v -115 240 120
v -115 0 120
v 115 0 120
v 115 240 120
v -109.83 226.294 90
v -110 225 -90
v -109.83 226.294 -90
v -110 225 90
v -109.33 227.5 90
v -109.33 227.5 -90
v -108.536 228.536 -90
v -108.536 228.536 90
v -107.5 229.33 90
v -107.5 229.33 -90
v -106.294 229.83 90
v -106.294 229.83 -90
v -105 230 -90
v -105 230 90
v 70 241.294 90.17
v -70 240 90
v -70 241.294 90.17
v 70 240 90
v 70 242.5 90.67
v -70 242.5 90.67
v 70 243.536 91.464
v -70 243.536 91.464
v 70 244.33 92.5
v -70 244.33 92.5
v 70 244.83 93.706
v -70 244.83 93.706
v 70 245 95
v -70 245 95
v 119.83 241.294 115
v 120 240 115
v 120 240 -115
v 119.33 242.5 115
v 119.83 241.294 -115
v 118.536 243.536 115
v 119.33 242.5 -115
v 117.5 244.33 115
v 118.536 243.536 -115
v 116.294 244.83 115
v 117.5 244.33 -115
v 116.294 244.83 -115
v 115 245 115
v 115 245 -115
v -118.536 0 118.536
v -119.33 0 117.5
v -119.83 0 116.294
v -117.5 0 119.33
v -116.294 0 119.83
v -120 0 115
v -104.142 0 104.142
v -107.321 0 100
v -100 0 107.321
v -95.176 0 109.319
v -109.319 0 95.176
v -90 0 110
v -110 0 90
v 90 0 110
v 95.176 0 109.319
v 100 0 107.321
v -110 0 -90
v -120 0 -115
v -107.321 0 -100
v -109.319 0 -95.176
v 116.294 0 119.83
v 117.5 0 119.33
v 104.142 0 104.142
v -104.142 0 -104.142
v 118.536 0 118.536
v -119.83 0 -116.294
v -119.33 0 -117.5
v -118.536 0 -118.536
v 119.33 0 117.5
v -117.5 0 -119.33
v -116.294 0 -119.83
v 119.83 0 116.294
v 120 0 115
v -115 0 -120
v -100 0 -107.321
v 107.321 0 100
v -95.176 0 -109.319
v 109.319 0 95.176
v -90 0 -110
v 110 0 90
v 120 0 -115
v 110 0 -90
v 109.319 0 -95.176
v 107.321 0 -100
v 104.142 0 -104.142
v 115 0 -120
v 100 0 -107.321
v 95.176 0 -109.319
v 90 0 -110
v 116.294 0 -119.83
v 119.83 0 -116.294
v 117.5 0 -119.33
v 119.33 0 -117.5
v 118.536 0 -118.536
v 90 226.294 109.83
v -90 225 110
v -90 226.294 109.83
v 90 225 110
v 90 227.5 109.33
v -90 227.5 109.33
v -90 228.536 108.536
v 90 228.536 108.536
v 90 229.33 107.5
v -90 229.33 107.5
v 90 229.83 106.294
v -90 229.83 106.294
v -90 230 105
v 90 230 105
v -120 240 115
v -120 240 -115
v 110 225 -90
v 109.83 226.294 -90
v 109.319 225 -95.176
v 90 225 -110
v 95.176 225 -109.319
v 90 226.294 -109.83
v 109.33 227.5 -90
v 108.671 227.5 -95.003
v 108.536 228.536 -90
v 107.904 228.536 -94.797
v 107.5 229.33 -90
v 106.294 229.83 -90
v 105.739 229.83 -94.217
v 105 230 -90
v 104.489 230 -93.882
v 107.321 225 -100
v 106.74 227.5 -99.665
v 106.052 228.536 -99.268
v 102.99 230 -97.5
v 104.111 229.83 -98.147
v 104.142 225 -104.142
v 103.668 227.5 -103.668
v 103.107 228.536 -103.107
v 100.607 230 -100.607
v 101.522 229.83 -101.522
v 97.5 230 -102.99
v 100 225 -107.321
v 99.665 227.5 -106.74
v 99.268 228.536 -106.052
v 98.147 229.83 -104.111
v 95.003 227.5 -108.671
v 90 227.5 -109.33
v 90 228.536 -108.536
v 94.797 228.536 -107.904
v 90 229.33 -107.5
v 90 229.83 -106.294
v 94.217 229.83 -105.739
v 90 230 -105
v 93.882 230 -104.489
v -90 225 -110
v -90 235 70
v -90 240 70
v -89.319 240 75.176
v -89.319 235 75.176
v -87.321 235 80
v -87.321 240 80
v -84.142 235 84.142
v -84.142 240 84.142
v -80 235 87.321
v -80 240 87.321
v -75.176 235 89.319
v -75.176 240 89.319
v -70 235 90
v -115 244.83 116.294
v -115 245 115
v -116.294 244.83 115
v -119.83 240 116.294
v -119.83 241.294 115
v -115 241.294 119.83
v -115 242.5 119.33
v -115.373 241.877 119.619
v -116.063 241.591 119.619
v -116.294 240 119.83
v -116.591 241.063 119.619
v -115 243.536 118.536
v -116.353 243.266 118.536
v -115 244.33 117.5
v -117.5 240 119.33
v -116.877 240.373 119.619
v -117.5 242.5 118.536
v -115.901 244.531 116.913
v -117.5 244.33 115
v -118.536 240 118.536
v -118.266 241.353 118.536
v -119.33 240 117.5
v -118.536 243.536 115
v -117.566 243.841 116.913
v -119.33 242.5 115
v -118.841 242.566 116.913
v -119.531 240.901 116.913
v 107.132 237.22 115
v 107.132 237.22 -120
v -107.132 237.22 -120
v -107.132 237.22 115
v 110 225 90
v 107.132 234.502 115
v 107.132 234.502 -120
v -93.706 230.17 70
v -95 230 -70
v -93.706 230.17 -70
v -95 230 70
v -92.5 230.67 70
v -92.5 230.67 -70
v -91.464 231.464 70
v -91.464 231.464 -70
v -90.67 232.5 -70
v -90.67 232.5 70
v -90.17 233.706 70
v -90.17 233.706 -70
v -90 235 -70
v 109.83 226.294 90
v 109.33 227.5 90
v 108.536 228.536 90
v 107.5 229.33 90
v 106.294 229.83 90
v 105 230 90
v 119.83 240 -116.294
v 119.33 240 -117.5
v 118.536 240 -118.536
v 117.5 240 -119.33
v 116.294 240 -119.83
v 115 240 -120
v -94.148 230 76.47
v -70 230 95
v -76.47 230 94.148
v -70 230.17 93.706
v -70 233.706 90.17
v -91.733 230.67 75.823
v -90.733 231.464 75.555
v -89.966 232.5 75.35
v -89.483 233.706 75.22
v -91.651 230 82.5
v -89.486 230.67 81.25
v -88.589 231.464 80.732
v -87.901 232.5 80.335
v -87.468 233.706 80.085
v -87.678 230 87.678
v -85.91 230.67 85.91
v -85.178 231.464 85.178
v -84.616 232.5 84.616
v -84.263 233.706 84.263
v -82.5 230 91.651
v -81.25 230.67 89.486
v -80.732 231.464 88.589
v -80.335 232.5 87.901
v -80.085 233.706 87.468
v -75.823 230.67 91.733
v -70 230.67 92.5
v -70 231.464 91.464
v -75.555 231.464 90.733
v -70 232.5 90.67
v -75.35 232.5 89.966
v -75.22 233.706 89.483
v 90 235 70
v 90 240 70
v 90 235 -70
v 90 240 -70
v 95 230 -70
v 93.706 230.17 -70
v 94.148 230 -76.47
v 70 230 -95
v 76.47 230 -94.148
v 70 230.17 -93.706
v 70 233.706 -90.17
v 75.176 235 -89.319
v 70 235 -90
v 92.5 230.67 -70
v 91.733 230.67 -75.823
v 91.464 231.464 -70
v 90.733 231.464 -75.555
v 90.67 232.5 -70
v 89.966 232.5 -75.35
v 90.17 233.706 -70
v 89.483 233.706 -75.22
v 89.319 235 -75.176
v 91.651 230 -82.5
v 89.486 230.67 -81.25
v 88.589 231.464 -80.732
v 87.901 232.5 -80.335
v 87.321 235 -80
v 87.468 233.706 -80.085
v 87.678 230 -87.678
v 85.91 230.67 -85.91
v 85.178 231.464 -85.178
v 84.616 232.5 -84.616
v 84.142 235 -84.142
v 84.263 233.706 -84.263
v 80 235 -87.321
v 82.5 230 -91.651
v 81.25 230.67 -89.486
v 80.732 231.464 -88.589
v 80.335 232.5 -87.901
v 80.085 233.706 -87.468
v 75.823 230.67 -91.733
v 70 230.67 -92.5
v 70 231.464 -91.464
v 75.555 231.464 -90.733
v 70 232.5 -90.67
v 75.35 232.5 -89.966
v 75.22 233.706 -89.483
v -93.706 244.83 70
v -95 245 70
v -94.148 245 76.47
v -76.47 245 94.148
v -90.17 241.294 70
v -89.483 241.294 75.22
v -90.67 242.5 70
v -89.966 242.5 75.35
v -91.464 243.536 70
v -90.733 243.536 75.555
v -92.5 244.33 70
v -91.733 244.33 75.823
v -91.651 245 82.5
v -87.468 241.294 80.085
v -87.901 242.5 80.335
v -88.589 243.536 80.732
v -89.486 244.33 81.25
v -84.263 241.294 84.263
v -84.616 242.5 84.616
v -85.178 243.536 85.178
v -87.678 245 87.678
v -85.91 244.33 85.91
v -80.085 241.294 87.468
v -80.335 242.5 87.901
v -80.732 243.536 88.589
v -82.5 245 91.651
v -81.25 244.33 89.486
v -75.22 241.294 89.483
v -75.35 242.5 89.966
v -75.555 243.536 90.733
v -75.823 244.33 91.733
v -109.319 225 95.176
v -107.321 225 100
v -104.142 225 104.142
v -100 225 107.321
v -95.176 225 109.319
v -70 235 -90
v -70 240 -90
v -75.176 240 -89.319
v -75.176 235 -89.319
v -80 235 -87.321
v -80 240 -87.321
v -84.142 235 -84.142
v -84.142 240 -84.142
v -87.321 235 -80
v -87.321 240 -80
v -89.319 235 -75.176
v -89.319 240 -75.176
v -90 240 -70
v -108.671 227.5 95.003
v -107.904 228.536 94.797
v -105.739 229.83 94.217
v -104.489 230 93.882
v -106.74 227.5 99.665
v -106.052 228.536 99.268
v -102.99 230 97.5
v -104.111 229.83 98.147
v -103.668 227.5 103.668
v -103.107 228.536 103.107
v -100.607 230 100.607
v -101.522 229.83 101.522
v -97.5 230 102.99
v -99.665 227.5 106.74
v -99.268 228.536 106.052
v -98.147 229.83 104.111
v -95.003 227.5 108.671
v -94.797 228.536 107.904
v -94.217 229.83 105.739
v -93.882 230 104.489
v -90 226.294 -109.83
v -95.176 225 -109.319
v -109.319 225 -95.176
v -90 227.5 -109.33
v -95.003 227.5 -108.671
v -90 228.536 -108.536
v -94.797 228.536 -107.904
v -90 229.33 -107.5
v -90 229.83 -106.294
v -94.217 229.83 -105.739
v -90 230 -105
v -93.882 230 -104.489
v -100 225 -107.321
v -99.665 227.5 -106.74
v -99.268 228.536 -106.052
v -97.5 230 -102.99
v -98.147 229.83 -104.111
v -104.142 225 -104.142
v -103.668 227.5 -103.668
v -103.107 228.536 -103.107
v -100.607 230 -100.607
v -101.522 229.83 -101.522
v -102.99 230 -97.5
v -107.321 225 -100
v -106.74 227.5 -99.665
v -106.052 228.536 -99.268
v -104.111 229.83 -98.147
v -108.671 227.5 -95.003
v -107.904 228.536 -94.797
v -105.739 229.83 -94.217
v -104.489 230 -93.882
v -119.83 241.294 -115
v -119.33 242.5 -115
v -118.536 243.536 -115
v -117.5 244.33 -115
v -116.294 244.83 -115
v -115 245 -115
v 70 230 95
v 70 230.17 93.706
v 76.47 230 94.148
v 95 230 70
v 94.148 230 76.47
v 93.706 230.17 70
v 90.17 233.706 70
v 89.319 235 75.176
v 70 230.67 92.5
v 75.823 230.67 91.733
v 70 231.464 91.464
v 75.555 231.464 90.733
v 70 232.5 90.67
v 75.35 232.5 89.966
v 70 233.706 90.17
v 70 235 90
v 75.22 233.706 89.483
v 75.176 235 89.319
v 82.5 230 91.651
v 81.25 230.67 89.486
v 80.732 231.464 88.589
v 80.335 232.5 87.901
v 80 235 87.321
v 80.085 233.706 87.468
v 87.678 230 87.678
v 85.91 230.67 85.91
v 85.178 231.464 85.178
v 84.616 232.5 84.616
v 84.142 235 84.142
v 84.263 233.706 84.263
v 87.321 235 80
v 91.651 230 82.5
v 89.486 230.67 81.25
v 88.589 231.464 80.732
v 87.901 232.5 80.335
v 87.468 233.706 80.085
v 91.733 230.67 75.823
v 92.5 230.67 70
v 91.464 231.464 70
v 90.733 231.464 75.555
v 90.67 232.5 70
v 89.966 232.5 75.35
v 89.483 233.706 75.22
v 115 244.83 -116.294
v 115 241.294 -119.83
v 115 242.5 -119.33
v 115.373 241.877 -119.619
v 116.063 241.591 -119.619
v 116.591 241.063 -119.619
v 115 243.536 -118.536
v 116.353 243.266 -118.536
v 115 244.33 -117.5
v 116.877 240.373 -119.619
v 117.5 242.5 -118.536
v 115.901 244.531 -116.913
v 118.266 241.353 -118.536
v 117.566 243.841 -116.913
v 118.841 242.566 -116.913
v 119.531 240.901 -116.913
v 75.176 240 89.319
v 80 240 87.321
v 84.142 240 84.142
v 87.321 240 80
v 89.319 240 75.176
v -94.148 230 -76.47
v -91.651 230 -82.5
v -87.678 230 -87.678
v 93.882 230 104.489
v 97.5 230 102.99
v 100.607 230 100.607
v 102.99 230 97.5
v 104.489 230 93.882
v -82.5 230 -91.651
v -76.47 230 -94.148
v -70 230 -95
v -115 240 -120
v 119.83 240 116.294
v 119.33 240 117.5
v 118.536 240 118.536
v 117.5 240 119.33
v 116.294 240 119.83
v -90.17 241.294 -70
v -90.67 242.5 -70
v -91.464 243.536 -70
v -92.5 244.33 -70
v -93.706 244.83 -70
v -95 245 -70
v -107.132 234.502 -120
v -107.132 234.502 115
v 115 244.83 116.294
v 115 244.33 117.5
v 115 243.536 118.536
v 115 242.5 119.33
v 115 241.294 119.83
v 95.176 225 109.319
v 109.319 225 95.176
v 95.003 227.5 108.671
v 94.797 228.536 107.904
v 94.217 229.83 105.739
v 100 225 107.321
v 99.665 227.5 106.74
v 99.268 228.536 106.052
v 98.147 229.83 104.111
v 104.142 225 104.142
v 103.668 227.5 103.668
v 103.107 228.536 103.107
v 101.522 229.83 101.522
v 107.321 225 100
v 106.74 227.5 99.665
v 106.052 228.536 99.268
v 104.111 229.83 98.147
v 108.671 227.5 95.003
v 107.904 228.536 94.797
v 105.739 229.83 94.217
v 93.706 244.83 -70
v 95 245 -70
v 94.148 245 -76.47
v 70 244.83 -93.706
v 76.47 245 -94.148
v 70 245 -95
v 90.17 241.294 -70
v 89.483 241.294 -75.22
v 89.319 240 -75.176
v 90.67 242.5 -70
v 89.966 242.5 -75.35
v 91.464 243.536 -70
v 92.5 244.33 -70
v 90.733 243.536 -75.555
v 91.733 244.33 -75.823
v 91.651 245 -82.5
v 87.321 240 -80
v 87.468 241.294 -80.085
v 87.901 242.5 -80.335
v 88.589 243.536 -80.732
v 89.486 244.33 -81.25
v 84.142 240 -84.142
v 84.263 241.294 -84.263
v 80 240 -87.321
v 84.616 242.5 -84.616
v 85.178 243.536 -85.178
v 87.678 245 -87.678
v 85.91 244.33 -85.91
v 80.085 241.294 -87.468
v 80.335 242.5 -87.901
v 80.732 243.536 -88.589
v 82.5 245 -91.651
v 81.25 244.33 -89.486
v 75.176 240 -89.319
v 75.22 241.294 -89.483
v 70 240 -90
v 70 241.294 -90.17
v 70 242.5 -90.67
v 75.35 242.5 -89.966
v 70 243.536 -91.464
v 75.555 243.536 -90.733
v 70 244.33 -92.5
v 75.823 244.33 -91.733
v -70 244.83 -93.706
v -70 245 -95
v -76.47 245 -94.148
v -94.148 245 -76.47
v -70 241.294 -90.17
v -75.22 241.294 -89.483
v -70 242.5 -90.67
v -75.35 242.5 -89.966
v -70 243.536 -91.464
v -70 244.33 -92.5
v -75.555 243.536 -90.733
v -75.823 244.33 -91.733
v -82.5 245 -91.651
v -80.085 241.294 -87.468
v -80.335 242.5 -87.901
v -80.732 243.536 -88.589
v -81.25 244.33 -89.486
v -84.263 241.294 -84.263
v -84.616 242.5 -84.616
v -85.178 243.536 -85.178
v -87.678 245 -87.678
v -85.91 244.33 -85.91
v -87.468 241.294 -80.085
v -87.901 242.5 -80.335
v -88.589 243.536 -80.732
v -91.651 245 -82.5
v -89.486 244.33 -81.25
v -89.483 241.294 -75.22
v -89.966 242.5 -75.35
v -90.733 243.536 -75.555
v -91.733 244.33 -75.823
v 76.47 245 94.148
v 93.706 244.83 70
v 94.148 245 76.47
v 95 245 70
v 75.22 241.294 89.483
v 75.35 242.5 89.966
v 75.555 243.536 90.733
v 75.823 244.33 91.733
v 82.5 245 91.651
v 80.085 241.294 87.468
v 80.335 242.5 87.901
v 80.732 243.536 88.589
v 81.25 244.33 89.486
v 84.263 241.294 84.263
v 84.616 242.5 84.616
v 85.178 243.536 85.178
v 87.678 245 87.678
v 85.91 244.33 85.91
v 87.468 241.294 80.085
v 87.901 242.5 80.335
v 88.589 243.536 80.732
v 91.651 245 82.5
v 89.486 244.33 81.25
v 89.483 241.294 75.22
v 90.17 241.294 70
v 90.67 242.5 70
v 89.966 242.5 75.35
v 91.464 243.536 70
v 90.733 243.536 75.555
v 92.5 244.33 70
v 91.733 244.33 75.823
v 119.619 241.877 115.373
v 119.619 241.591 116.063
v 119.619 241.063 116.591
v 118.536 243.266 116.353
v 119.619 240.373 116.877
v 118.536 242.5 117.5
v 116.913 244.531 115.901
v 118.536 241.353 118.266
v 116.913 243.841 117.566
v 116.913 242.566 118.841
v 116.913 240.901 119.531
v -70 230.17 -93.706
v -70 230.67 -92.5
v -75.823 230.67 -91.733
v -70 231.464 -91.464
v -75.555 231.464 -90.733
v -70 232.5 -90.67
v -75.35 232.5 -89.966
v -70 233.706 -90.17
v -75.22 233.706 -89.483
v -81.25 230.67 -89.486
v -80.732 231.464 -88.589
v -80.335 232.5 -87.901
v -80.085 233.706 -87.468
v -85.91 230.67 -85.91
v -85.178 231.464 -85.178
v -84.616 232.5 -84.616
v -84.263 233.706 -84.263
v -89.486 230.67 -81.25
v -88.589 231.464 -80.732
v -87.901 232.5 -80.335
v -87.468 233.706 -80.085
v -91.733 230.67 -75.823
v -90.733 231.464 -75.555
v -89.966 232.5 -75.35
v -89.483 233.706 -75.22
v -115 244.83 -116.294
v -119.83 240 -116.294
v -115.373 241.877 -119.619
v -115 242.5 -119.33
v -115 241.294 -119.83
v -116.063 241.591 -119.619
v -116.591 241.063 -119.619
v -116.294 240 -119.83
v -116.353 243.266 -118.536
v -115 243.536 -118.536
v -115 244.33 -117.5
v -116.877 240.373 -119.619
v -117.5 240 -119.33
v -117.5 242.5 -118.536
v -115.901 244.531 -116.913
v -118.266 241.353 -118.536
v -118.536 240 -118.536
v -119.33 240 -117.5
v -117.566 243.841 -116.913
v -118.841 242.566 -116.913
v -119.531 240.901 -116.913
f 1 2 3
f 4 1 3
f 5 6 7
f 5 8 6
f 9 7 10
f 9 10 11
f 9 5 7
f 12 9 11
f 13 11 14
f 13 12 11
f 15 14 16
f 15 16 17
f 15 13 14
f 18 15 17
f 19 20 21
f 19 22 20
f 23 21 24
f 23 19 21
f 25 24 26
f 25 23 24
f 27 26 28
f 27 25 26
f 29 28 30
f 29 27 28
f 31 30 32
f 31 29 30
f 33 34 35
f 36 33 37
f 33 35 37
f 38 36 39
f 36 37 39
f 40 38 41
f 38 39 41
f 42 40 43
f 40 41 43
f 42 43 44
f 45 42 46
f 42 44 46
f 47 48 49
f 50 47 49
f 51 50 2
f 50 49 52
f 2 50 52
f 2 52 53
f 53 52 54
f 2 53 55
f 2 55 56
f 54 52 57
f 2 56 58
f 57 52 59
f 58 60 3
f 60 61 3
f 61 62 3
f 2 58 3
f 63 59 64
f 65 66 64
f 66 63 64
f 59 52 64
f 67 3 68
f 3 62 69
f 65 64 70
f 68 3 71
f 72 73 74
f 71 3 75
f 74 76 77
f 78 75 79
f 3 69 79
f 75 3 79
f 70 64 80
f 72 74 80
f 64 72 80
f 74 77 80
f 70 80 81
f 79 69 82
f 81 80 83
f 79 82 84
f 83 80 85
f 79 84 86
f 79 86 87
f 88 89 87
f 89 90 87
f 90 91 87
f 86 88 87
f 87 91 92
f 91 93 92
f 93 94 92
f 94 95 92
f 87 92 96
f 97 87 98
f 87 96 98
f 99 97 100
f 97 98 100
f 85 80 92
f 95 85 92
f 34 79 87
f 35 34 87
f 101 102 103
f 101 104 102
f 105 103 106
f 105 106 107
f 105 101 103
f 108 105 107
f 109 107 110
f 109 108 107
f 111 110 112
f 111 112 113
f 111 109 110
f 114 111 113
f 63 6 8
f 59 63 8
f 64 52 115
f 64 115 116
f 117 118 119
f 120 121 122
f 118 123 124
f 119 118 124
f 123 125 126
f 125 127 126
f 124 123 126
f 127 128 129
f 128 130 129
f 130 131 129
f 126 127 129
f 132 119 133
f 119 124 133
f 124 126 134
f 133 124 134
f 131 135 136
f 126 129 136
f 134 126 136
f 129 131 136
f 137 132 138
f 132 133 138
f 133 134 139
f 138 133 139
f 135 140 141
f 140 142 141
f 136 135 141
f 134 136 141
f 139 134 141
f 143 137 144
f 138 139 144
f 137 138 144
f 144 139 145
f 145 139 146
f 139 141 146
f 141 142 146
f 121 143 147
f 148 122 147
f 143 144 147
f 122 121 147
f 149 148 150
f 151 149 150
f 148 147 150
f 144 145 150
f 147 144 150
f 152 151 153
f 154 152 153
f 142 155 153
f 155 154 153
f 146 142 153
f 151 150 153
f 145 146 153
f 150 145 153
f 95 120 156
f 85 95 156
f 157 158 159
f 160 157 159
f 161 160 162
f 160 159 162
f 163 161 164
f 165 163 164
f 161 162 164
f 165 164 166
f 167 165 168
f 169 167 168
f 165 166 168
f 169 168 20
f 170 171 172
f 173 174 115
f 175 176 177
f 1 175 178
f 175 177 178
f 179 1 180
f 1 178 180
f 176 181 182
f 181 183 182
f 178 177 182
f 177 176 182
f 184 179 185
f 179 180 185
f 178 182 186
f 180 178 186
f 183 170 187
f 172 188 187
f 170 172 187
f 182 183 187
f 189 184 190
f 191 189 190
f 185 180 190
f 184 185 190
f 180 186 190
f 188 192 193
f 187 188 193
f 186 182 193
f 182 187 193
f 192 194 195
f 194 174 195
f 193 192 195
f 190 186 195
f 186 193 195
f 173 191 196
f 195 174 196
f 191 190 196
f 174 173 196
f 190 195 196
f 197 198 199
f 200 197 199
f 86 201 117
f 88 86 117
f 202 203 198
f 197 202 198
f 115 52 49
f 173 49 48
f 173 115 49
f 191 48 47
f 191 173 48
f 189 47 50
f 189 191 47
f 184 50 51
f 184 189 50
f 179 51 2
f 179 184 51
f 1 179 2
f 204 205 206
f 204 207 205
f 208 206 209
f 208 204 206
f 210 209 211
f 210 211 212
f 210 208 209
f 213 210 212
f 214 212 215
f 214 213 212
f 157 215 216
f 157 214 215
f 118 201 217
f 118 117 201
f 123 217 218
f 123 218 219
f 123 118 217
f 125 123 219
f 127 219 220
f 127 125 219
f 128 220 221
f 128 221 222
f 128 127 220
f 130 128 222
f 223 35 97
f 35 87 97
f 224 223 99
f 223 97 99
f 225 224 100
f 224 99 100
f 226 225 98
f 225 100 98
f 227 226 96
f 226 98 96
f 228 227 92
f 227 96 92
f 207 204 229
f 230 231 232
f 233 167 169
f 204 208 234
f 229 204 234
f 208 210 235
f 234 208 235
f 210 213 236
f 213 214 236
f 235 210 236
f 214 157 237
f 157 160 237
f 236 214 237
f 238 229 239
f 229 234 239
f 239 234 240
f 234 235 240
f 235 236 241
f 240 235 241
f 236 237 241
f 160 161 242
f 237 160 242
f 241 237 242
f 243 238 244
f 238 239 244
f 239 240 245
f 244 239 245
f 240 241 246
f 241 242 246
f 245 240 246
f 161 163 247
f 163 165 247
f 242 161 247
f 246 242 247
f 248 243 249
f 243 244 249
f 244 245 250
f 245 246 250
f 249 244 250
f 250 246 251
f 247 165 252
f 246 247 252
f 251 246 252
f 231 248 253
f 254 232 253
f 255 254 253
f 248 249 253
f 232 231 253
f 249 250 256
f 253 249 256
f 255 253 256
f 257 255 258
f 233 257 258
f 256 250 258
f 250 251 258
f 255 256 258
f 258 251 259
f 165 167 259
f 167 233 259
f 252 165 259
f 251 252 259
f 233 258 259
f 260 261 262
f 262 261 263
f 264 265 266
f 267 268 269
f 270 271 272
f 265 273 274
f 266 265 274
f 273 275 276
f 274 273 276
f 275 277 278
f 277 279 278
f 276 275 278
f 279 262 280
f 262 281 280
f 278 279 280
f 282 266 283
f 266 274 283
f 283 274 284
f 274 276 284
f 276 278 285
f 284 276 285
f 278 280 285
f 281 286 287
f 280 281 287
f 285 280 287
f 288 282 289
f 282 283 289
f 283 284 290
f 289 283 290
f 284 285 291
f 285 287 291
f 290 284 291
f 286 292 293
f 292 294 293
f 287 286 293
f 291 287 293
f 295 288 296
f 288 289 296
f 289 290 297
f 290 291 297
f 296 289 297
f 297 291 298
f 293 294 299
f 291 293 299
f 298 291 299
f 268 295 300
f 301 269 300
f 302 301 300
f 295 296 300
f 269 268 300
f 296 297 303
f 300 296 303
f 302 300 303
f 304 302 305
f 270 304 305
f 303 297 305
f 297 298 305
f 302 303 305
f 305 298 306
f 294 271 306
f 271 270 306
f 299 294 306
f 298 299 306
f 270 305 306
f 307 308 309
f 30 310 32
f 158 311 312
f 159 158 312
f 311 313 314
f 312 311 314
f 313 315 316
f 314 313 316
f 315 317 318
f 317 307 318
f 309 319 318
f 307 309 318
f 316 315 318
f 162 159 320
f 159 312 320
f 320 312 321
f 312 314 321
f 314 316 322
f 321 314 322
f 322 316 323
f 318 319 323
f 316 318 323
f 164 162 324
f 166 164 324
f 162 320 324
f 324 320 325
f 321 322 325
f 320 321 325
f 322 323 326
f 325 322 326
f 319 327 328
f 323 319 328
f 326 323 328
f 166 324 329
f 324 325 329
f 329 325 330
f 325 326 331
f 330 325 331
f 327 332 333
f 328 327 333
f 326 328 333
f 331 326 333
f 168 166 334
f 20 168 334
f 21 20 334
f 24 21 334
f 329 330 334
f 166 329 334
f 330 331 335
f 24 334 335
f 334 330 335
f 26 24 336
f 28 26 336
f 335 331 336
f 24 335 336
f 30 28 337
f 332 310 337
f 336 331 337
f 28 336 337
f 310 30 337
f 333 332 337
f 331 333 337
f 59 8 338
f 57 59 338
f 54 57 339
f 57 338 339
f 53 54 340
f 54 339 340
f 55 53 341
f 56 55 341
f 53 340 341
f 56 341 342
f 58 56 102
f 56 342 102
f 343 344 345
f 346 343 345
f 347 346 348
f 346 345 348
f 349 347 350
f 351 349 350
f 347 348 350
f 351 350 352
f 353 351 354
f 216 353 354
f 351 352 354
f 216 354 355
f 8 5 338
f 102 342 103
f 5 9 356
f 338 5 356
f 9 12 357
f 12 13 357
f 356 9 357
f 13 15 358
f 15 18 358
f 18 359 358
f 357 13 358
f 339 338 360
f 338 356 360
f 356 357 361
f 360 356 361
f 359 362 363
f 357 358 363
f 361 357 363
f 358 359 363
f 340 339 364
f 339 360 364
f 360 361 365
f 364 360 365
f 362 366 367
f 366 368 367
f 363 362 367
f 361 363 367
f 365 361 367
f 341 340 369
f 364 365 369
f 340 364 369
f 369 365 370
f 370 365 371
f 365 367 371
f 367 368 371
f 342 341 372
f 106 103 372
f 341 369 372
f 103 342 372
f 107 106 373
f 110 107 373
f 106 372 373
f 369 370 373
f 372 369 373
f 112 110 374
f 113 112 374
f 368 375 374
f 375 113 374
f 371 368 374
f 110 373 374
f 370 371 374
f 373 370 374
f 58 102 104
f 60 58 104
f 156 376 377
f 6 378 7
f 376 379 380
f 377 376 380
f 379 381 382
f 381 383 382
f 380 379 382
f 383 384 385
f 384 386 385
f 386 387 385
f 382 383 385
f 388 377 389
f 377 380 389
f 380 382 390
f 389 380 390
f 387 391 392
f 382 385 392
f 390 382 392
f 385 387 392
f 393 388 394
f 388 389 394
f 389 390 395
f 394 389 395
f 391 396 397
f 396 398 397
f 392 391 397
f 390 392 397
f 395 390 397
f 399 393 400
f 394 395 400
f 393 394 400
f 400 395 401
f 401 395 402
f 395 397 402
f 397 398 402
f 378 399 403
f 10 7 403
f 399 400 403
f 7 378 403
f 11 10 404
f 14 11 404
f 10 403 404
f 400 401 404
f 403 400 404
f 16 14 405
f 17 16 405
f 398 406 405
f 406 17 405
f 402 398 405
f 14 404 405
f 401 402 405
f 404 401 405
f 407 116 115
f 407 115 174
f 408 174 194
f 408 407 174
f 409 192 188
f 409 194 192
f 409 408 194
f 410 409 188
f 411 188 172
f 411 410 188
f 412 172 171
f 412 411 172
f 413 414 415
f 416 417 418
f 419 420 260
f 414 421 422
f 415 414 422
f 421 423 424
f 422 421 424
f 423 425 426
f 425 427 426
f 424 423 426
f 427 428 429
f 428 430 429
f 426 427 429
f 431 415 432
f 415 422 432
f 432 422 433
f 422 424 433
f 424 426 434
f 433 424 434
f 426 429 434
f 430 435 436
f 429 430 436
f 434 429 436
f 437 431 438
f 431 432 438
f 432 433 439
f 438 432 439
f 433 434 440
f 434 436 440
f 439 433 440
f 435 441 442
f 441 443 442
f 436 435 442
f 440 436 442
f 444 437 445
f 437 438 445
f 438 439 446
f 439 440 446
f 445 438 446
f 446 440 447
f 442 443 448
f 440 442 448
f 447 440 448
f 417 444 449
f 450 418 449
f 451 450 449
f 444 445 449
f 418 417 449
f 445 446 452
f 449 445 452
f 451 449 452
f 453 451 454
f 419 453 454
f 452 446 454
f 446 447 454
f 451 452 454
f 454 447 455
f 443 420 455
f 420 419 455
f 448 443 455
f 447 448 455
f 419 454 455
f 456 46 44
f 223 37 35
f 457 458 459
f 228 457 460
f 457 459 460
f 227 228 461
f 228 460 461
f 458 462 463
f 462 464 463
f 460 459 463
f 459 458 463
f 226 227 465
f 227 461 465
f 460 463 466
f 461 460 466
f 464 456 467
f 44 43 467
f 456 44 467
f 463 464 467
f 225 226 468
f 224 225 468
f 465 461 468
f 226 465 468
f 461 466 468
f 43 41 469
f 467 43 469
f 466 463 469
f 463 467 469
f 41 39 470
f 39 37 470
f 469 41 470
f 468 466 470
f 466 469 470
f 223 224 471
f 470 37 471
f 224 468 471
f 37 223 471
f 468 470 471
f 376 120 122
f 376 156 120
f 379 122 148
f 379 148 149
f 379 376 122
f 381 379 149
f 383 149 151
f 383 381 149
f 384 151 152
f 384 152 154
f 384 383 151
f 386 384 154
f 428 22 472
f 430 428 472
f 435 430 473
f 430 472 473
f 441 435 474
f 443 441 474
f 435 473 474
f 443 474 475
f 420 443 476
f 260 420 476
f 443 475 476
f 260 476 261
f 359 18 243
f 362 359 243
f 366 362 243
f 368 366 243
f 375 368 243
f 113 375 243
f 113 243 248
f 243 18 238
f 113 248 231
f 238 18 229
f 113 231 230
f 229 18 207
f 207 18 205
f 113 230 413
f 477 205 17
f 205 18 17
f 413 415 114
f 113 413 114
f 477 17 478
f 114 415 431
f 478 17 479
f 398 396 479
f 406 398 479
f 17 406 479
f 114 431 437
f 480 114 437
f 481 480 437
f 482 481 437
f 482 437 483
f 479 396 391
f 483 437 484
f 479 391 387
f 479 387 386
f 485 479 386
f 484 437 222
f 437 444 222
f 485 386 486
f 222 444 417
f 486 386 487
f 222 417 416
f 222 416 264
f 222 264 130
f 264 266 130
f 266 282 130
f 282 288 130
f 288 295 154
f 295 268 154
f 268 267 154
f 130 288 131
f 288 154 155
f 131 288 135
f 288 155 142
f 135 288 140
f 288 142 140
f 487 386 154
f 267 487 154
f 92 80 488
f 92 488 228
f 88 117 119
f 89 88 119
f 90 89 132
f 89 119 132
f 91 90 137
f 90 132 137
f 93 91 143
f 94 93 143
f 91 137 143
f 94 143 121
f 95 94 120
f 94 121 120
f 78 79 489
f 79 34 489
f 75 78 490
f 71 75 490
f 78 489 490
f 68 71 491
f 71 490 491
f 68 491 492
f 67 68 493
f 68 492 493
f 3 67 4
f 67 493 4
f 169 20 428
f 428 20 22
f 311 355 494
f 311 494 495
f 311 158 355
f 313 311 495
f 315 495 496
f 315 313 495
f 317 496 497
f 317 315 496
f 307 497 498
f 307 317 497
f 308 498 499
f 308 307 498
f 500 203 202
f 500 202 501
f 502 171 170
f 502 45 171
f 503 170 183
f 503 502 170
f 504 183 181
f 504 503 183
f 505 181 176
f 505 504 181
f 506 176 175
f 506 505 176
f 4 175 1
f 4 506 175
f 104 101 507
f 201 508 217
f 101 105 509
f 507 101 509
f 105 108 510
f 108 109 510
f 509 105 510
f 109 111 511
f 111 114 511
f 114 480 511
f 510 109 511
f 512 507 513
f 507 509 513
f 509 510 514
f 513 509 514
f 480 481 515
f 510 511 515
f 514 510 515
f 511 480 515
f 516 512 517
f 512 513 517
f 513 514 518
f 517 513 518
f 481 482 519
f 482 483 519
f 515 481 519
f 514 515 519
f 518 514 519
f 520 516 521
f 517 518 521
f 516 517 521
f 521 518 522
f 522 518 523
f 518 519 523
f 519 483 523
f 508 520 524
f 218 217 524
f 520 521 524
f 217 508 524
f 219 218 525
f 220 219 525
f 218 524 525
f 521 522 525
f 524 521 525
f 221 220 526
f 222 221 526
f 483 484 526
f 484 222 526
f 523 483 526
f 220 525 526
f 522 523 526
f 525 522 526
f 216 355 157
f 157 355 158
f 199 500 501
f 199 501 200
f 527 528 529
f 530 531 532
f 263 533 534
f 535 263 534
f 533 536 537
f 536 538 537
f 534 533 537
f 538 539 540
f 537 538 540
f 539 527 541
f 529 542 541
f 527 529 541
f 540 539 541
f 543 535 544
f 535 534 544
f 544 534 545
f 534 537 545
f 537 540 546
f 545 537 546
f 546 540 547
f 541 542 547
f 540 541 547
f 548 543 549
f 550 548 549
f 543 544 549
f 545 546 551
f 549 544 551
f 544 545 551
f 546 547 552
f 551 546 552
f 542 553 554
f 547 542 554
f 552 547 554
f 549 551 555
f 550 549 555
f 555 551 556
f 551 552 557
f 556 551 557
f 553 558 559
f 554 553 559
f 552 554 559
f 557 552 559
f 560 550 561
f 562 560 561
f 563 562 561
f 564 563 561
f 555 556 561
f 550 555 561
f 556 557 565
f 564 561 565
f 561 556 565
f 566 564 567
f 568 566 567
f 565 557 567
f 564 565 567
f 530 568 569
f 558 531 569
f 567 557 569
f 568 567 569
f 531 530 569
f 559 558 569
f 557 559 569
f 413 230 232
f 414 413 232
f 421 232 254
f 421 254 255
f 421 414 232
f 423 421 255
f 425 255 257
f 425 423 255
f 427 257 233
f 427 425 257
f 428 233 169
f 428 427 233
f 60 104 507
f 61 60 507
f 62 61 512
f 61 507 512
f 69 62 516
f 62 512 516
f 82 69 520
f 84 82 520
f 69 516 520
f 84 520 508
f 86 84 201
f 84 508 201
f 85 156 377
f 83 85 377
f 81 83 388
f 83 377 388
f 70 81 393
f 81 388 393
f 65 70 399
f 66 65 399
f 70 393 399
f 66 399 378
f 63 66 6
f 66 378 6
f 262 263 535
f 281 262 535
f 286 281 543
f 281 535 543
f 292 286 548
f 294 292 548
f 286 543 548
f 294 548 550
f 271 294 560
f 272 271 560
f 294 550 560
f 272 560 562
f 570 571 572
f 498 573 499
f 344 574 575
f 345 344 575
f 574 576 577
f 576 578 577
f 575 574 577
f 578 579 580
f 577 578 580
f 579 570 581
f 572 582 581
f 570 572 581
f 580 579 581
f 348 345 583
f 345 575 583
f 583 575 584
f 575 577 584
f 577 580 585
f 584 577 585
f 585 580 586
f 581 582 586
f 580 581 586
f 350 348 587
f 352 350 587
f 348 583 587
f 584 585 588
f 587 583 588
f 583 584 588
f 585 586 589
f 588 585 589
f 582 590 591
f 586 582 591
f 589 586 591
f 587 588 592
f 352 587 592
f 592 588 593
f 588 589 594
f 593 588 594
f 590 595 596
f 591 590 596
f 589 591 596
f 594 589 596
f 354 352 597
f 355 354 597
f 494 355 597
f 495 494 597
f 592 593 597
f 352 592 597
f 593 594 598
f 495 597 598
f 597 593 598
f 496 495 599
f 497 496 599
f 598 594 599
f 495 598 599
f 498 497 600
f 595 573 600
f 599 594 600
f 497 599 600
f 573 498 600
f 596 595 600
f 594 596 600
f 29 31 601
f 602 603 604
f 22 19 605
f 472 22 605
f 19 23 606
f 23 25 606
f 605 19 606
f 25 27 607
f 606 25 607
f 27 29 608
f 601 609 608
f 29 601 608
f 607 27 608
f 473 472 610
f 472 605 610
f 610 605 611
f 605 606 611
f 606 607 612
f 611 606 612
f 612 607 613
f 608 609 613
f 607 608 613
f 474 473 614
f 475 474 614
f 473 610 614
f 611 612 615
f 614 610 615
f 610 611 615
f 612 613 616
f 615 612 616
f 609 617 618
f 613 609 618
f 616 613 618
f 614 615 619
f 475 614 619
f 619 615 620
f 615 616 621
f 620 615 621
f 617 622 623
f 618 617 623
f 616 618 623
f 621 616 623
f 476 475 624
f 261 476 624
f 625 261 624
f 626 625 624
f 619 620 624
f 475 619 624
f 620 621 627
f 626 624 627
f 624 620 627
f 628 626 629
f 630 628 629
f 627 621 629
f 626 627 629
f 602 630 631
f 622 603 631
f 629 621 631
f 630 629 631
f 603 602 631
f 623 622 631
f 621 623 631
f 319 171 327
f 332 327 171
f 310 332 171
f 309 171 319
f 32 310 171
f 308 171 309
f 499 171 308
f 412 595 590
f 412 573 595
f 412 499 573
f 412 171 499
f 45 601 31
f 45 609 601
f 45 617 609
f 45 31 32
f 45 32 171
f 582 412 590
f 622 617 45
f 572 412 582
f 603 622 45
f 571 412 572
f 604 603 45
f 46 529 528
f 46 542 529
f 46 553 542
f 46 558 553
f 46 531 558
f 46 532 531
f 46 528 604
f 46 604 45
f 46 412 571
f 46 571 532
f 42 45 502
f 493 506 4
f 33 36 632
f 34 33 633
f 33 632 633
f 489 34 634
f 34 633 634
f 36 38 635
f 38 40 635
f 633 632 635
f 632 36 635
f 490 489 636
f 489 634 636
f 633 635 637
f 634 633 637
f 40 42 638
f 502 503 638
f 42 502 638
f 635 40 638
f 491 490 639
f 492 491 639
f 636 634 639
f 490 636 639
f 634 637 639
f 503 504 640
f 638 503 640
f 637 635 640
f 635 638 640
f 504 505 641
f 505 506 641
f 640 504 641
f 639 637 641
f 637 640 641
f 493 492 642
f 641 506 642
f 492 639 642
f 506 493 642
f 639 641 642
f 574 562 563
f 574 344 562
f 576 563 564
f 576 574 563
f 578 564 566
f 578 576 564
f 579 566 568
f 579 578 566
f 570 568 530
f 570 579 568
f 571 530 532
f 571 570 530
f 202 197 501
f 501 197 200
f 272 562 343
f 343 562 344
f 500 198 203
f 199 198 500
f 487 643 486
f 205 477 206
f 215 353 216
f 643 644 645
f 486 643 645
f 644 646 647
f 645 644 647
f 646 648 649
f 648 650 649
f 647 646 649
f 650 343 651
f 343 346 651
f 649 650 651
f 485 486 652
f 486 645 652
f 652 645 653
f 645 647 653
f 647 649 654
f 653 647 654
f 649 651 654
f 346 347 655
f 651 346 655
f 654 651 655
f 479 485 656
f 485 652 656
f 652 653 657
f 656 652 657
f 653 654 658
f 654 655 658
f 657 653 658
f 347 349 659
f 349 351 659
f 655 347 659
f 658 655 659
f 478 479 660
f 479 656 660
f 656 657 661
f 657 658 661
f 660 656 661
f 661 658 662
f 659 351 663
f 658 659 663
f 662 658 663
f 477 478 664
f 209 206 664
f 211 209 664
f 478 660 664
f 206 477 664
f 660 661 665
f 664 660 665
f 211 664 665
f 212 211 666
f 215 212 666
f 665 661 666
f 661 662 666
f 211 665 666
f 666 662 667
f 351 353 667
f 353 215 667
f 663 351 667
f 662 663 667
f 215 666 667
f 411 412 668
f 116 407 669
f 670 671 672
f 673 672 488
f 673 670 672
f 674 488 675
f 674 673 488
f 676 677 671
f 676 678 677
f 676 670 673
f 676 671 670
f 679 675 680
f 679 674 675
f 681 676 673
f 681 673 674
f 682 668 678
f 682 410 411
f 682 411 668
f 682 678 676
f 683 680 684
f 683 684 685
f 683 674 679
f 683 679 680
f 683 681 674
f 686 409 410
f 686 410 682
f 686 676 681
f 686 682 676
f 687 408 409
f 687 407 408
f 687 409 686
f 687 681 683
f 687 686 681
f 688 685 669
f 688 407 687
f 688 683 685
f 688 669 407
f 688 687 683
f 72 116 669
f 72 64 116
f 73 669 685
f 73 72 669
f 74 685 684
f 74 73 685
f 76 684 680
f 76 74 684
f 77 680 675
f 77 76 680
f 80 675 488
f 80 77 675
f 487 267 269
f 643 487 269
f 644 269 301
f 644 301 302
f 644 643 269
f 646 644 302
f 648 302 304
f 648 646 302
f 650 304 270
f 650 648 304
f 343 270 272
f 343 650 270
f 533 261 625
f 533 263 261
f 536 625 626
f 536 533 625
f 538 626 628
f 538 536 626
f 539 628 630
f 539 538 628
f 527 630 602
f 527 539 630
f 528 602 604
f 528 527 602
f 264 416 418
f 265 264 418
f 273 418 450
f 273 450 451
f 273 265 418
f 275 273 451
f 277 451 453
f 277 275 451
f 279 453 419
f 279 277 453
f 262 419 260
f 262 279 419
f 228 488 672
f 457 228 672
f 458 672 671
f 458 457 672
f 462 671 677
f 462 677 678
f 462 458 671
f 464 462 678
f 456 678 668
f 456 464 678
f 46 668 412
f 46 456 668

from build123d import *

# Parameters (mm, degrees)
SKETCH_1_W          = 240
SKETCH_1_H          = 240
SKETCH_1_W_2        = 220
SKETCH_1_H_2        = 220
EXTRUDE_1_DEPTH     = 230
SKETCH_2_W          = 240
SKETCH_2_H          = 240
EXTRUDE_1_2_DEPTH   = 15
SKETCH_5_W          = 240
SKETCH_5_H          = 240
EXTRUDE_3_DEPTH     = 230
FILLET_1_R          = 5
FILLET_2_R          = 5
CUT_EXTRUDE_2_DEPTH = 230
SKETCH_9_W          = 214.264204386
SKETCH_9_H          = 2.717939168
EXTRUDE_5_DEPTH     = 235
FILLET_3_R          = 5


with BuildPart() as part:
    # 草图1 → Extrude 1 (new body)
    with BuildSketch(Plane(origin=(0, 0, 0), x_dir=(1, 0, 0), z_dir=(0, 1, 0))):
        Rectangle(SKETCH_1_W, SKETCH_1_H)
        Rectangle(SKETCH_1_W_2, SKETCH_1_H_2, mode=Mode.SUBTRACT)
    extrude(amount=EXTRUDE_1_DEPTH)

    # 草图2 → Extrude 1 2 (add)
    with BuildSketch(Plane(origin=(0, 230, 0), x_dir=(1, 0, 0), z_dir=(0, 1, 0))):
        Rectangle(SKETCH_2_W, SKETCH_2_H)
    extrude(amount=EXTRUDE_1_2_DEPTH)

    # 草图5 → 凸台-拉伸3 (add)
    with BuildSketch(Plane.XZ.offset(-230)):
        Rectangle(SKETCH_5_W, SKETCH_5_H)
        with BuildLine():
            Line((-90, 110), (90, 110))
            ThreePointArc((90, 110), (104.142135624, 104.142135624), (110, 90))
            Line((110, 90), (110, -90))
            ThreePointArc((110, -90), (104.142135624, -104.142135624), (90, -110))
            Line((90, -110), (-90, -110))
            ThreePointArc((-90, -110), (-104.142135624, -104.142135624), (-110, -90))
            Line((-110, -90), (-110, 90))
            ThreePointArc((-110, 90), (-104.142135624, 104.142135624), (-90, 110))
        make_face(mode=Mode.SUBTRACT)
    extrude(amount=EXTRUDE_3_DEPTH)

    # 圆角1
    fillet_1_edges = [part.edges().sort_by_distance(p)[0] for p in [
        (-120, 245, 0),
        (0, 245, 120),
        (120, 245, 0),
        (0, 245, -120),
        (120, 122.5, 120),
        (-120, 122.5, 120),
        (-120, 122.5, -120),
        (120, 122.5, -120),
    ]]
    fillet(fillet_1_edges, radius=FILLET_1_R)

    # 圆角2
    fillet_2_edges = [part.edges().sort_by_distance(p)[0] for p in [
        (0, 230, -110),
        (110, 230, 0),
        (0, 230, 110),
        (-110, 230, 0),
        (104.142135624, 230, -104.142135624),
        (-104.142135624, 230, -104.142135624),
        (-104.142135624, 230, 104.142135624),
        (104.142135624, 230, 104.142135624),
    ]]
    fillet(fillet_2_edges, radius=FILLET_2_R)

    # 草图6 → 切除-拉伸2 (cut)
    with BuildSketch(Plane(origin=(0, 245, 0), x_dir=(1, 0, 0), z_dir=(0, 1, 0))):
        with BuildLine():
            Line((-70, -90), (70, -90))
            ThreePointArc((70, -90), (84.142135624, -84.142135624), (90, -70))
            Line((90, -70), (90, 70))
            ThreePointArc((90, 70), (84.142135624, 84.142135624), (70, 90))
            Line((70, 90), (-70, 90))
            ThreePointArc((-70, 90), (-84.142135624, 84.142135624), (-90, 70))
            Line((-90, 70), (-90, -70))
            ThreePointArc((-90, -70), (-84.142135624, -84.142135624), (-70, -90))
        make_face()
    extrude(amount=-CUT_EXTRUDE_2_DEPTH, mode=Mode.SUBTRACT)

    # 圆角3
    fillet_3_edges = [part.edges().sort_by_distance(p)[0] for p in [
        (-84.142135624, 230, 84.142135624),
        (-90, 230, 0),
        (-84.142135624, 230, -84.142135624),
        (0, 230, -90),
        (84.142135624, 230, -84.142135624),
        (90, 230, 0),
        (84.142135624, 230, 84.142135624),
        (0, 230, 90),
        (-84.142135624, 245, 84.142135624),
        (0, 245, 90),
        (84.142135624, 245, 84.142135624),
        (90, 245, 0),
        (84.142135624, 245, -84.142135624),
        (0, 245, -90),
        (-84.142135624, 245, -84.142135624),
        (-90, 245, 0),
    ]]
    fillet(fillet_3_edges, radius=FILLET_3_R)


with BuildPart() as body_2:
    # 草图9 → 凸台-拉伸5 (new body)
    with BuildSketch(Plane(origin=(0, 0, -120), x_dir=(-1, 0, 0), z_dir=(0, 0, -1))):
        with Locations((0, 235.860712786)):
            Rectangle(SKETCH_9_W, SKETCH_9_H)
    extrude(amount=-EXTRUDE_5_DEPTH)


solid = Compound([part.part, body_2.part])
